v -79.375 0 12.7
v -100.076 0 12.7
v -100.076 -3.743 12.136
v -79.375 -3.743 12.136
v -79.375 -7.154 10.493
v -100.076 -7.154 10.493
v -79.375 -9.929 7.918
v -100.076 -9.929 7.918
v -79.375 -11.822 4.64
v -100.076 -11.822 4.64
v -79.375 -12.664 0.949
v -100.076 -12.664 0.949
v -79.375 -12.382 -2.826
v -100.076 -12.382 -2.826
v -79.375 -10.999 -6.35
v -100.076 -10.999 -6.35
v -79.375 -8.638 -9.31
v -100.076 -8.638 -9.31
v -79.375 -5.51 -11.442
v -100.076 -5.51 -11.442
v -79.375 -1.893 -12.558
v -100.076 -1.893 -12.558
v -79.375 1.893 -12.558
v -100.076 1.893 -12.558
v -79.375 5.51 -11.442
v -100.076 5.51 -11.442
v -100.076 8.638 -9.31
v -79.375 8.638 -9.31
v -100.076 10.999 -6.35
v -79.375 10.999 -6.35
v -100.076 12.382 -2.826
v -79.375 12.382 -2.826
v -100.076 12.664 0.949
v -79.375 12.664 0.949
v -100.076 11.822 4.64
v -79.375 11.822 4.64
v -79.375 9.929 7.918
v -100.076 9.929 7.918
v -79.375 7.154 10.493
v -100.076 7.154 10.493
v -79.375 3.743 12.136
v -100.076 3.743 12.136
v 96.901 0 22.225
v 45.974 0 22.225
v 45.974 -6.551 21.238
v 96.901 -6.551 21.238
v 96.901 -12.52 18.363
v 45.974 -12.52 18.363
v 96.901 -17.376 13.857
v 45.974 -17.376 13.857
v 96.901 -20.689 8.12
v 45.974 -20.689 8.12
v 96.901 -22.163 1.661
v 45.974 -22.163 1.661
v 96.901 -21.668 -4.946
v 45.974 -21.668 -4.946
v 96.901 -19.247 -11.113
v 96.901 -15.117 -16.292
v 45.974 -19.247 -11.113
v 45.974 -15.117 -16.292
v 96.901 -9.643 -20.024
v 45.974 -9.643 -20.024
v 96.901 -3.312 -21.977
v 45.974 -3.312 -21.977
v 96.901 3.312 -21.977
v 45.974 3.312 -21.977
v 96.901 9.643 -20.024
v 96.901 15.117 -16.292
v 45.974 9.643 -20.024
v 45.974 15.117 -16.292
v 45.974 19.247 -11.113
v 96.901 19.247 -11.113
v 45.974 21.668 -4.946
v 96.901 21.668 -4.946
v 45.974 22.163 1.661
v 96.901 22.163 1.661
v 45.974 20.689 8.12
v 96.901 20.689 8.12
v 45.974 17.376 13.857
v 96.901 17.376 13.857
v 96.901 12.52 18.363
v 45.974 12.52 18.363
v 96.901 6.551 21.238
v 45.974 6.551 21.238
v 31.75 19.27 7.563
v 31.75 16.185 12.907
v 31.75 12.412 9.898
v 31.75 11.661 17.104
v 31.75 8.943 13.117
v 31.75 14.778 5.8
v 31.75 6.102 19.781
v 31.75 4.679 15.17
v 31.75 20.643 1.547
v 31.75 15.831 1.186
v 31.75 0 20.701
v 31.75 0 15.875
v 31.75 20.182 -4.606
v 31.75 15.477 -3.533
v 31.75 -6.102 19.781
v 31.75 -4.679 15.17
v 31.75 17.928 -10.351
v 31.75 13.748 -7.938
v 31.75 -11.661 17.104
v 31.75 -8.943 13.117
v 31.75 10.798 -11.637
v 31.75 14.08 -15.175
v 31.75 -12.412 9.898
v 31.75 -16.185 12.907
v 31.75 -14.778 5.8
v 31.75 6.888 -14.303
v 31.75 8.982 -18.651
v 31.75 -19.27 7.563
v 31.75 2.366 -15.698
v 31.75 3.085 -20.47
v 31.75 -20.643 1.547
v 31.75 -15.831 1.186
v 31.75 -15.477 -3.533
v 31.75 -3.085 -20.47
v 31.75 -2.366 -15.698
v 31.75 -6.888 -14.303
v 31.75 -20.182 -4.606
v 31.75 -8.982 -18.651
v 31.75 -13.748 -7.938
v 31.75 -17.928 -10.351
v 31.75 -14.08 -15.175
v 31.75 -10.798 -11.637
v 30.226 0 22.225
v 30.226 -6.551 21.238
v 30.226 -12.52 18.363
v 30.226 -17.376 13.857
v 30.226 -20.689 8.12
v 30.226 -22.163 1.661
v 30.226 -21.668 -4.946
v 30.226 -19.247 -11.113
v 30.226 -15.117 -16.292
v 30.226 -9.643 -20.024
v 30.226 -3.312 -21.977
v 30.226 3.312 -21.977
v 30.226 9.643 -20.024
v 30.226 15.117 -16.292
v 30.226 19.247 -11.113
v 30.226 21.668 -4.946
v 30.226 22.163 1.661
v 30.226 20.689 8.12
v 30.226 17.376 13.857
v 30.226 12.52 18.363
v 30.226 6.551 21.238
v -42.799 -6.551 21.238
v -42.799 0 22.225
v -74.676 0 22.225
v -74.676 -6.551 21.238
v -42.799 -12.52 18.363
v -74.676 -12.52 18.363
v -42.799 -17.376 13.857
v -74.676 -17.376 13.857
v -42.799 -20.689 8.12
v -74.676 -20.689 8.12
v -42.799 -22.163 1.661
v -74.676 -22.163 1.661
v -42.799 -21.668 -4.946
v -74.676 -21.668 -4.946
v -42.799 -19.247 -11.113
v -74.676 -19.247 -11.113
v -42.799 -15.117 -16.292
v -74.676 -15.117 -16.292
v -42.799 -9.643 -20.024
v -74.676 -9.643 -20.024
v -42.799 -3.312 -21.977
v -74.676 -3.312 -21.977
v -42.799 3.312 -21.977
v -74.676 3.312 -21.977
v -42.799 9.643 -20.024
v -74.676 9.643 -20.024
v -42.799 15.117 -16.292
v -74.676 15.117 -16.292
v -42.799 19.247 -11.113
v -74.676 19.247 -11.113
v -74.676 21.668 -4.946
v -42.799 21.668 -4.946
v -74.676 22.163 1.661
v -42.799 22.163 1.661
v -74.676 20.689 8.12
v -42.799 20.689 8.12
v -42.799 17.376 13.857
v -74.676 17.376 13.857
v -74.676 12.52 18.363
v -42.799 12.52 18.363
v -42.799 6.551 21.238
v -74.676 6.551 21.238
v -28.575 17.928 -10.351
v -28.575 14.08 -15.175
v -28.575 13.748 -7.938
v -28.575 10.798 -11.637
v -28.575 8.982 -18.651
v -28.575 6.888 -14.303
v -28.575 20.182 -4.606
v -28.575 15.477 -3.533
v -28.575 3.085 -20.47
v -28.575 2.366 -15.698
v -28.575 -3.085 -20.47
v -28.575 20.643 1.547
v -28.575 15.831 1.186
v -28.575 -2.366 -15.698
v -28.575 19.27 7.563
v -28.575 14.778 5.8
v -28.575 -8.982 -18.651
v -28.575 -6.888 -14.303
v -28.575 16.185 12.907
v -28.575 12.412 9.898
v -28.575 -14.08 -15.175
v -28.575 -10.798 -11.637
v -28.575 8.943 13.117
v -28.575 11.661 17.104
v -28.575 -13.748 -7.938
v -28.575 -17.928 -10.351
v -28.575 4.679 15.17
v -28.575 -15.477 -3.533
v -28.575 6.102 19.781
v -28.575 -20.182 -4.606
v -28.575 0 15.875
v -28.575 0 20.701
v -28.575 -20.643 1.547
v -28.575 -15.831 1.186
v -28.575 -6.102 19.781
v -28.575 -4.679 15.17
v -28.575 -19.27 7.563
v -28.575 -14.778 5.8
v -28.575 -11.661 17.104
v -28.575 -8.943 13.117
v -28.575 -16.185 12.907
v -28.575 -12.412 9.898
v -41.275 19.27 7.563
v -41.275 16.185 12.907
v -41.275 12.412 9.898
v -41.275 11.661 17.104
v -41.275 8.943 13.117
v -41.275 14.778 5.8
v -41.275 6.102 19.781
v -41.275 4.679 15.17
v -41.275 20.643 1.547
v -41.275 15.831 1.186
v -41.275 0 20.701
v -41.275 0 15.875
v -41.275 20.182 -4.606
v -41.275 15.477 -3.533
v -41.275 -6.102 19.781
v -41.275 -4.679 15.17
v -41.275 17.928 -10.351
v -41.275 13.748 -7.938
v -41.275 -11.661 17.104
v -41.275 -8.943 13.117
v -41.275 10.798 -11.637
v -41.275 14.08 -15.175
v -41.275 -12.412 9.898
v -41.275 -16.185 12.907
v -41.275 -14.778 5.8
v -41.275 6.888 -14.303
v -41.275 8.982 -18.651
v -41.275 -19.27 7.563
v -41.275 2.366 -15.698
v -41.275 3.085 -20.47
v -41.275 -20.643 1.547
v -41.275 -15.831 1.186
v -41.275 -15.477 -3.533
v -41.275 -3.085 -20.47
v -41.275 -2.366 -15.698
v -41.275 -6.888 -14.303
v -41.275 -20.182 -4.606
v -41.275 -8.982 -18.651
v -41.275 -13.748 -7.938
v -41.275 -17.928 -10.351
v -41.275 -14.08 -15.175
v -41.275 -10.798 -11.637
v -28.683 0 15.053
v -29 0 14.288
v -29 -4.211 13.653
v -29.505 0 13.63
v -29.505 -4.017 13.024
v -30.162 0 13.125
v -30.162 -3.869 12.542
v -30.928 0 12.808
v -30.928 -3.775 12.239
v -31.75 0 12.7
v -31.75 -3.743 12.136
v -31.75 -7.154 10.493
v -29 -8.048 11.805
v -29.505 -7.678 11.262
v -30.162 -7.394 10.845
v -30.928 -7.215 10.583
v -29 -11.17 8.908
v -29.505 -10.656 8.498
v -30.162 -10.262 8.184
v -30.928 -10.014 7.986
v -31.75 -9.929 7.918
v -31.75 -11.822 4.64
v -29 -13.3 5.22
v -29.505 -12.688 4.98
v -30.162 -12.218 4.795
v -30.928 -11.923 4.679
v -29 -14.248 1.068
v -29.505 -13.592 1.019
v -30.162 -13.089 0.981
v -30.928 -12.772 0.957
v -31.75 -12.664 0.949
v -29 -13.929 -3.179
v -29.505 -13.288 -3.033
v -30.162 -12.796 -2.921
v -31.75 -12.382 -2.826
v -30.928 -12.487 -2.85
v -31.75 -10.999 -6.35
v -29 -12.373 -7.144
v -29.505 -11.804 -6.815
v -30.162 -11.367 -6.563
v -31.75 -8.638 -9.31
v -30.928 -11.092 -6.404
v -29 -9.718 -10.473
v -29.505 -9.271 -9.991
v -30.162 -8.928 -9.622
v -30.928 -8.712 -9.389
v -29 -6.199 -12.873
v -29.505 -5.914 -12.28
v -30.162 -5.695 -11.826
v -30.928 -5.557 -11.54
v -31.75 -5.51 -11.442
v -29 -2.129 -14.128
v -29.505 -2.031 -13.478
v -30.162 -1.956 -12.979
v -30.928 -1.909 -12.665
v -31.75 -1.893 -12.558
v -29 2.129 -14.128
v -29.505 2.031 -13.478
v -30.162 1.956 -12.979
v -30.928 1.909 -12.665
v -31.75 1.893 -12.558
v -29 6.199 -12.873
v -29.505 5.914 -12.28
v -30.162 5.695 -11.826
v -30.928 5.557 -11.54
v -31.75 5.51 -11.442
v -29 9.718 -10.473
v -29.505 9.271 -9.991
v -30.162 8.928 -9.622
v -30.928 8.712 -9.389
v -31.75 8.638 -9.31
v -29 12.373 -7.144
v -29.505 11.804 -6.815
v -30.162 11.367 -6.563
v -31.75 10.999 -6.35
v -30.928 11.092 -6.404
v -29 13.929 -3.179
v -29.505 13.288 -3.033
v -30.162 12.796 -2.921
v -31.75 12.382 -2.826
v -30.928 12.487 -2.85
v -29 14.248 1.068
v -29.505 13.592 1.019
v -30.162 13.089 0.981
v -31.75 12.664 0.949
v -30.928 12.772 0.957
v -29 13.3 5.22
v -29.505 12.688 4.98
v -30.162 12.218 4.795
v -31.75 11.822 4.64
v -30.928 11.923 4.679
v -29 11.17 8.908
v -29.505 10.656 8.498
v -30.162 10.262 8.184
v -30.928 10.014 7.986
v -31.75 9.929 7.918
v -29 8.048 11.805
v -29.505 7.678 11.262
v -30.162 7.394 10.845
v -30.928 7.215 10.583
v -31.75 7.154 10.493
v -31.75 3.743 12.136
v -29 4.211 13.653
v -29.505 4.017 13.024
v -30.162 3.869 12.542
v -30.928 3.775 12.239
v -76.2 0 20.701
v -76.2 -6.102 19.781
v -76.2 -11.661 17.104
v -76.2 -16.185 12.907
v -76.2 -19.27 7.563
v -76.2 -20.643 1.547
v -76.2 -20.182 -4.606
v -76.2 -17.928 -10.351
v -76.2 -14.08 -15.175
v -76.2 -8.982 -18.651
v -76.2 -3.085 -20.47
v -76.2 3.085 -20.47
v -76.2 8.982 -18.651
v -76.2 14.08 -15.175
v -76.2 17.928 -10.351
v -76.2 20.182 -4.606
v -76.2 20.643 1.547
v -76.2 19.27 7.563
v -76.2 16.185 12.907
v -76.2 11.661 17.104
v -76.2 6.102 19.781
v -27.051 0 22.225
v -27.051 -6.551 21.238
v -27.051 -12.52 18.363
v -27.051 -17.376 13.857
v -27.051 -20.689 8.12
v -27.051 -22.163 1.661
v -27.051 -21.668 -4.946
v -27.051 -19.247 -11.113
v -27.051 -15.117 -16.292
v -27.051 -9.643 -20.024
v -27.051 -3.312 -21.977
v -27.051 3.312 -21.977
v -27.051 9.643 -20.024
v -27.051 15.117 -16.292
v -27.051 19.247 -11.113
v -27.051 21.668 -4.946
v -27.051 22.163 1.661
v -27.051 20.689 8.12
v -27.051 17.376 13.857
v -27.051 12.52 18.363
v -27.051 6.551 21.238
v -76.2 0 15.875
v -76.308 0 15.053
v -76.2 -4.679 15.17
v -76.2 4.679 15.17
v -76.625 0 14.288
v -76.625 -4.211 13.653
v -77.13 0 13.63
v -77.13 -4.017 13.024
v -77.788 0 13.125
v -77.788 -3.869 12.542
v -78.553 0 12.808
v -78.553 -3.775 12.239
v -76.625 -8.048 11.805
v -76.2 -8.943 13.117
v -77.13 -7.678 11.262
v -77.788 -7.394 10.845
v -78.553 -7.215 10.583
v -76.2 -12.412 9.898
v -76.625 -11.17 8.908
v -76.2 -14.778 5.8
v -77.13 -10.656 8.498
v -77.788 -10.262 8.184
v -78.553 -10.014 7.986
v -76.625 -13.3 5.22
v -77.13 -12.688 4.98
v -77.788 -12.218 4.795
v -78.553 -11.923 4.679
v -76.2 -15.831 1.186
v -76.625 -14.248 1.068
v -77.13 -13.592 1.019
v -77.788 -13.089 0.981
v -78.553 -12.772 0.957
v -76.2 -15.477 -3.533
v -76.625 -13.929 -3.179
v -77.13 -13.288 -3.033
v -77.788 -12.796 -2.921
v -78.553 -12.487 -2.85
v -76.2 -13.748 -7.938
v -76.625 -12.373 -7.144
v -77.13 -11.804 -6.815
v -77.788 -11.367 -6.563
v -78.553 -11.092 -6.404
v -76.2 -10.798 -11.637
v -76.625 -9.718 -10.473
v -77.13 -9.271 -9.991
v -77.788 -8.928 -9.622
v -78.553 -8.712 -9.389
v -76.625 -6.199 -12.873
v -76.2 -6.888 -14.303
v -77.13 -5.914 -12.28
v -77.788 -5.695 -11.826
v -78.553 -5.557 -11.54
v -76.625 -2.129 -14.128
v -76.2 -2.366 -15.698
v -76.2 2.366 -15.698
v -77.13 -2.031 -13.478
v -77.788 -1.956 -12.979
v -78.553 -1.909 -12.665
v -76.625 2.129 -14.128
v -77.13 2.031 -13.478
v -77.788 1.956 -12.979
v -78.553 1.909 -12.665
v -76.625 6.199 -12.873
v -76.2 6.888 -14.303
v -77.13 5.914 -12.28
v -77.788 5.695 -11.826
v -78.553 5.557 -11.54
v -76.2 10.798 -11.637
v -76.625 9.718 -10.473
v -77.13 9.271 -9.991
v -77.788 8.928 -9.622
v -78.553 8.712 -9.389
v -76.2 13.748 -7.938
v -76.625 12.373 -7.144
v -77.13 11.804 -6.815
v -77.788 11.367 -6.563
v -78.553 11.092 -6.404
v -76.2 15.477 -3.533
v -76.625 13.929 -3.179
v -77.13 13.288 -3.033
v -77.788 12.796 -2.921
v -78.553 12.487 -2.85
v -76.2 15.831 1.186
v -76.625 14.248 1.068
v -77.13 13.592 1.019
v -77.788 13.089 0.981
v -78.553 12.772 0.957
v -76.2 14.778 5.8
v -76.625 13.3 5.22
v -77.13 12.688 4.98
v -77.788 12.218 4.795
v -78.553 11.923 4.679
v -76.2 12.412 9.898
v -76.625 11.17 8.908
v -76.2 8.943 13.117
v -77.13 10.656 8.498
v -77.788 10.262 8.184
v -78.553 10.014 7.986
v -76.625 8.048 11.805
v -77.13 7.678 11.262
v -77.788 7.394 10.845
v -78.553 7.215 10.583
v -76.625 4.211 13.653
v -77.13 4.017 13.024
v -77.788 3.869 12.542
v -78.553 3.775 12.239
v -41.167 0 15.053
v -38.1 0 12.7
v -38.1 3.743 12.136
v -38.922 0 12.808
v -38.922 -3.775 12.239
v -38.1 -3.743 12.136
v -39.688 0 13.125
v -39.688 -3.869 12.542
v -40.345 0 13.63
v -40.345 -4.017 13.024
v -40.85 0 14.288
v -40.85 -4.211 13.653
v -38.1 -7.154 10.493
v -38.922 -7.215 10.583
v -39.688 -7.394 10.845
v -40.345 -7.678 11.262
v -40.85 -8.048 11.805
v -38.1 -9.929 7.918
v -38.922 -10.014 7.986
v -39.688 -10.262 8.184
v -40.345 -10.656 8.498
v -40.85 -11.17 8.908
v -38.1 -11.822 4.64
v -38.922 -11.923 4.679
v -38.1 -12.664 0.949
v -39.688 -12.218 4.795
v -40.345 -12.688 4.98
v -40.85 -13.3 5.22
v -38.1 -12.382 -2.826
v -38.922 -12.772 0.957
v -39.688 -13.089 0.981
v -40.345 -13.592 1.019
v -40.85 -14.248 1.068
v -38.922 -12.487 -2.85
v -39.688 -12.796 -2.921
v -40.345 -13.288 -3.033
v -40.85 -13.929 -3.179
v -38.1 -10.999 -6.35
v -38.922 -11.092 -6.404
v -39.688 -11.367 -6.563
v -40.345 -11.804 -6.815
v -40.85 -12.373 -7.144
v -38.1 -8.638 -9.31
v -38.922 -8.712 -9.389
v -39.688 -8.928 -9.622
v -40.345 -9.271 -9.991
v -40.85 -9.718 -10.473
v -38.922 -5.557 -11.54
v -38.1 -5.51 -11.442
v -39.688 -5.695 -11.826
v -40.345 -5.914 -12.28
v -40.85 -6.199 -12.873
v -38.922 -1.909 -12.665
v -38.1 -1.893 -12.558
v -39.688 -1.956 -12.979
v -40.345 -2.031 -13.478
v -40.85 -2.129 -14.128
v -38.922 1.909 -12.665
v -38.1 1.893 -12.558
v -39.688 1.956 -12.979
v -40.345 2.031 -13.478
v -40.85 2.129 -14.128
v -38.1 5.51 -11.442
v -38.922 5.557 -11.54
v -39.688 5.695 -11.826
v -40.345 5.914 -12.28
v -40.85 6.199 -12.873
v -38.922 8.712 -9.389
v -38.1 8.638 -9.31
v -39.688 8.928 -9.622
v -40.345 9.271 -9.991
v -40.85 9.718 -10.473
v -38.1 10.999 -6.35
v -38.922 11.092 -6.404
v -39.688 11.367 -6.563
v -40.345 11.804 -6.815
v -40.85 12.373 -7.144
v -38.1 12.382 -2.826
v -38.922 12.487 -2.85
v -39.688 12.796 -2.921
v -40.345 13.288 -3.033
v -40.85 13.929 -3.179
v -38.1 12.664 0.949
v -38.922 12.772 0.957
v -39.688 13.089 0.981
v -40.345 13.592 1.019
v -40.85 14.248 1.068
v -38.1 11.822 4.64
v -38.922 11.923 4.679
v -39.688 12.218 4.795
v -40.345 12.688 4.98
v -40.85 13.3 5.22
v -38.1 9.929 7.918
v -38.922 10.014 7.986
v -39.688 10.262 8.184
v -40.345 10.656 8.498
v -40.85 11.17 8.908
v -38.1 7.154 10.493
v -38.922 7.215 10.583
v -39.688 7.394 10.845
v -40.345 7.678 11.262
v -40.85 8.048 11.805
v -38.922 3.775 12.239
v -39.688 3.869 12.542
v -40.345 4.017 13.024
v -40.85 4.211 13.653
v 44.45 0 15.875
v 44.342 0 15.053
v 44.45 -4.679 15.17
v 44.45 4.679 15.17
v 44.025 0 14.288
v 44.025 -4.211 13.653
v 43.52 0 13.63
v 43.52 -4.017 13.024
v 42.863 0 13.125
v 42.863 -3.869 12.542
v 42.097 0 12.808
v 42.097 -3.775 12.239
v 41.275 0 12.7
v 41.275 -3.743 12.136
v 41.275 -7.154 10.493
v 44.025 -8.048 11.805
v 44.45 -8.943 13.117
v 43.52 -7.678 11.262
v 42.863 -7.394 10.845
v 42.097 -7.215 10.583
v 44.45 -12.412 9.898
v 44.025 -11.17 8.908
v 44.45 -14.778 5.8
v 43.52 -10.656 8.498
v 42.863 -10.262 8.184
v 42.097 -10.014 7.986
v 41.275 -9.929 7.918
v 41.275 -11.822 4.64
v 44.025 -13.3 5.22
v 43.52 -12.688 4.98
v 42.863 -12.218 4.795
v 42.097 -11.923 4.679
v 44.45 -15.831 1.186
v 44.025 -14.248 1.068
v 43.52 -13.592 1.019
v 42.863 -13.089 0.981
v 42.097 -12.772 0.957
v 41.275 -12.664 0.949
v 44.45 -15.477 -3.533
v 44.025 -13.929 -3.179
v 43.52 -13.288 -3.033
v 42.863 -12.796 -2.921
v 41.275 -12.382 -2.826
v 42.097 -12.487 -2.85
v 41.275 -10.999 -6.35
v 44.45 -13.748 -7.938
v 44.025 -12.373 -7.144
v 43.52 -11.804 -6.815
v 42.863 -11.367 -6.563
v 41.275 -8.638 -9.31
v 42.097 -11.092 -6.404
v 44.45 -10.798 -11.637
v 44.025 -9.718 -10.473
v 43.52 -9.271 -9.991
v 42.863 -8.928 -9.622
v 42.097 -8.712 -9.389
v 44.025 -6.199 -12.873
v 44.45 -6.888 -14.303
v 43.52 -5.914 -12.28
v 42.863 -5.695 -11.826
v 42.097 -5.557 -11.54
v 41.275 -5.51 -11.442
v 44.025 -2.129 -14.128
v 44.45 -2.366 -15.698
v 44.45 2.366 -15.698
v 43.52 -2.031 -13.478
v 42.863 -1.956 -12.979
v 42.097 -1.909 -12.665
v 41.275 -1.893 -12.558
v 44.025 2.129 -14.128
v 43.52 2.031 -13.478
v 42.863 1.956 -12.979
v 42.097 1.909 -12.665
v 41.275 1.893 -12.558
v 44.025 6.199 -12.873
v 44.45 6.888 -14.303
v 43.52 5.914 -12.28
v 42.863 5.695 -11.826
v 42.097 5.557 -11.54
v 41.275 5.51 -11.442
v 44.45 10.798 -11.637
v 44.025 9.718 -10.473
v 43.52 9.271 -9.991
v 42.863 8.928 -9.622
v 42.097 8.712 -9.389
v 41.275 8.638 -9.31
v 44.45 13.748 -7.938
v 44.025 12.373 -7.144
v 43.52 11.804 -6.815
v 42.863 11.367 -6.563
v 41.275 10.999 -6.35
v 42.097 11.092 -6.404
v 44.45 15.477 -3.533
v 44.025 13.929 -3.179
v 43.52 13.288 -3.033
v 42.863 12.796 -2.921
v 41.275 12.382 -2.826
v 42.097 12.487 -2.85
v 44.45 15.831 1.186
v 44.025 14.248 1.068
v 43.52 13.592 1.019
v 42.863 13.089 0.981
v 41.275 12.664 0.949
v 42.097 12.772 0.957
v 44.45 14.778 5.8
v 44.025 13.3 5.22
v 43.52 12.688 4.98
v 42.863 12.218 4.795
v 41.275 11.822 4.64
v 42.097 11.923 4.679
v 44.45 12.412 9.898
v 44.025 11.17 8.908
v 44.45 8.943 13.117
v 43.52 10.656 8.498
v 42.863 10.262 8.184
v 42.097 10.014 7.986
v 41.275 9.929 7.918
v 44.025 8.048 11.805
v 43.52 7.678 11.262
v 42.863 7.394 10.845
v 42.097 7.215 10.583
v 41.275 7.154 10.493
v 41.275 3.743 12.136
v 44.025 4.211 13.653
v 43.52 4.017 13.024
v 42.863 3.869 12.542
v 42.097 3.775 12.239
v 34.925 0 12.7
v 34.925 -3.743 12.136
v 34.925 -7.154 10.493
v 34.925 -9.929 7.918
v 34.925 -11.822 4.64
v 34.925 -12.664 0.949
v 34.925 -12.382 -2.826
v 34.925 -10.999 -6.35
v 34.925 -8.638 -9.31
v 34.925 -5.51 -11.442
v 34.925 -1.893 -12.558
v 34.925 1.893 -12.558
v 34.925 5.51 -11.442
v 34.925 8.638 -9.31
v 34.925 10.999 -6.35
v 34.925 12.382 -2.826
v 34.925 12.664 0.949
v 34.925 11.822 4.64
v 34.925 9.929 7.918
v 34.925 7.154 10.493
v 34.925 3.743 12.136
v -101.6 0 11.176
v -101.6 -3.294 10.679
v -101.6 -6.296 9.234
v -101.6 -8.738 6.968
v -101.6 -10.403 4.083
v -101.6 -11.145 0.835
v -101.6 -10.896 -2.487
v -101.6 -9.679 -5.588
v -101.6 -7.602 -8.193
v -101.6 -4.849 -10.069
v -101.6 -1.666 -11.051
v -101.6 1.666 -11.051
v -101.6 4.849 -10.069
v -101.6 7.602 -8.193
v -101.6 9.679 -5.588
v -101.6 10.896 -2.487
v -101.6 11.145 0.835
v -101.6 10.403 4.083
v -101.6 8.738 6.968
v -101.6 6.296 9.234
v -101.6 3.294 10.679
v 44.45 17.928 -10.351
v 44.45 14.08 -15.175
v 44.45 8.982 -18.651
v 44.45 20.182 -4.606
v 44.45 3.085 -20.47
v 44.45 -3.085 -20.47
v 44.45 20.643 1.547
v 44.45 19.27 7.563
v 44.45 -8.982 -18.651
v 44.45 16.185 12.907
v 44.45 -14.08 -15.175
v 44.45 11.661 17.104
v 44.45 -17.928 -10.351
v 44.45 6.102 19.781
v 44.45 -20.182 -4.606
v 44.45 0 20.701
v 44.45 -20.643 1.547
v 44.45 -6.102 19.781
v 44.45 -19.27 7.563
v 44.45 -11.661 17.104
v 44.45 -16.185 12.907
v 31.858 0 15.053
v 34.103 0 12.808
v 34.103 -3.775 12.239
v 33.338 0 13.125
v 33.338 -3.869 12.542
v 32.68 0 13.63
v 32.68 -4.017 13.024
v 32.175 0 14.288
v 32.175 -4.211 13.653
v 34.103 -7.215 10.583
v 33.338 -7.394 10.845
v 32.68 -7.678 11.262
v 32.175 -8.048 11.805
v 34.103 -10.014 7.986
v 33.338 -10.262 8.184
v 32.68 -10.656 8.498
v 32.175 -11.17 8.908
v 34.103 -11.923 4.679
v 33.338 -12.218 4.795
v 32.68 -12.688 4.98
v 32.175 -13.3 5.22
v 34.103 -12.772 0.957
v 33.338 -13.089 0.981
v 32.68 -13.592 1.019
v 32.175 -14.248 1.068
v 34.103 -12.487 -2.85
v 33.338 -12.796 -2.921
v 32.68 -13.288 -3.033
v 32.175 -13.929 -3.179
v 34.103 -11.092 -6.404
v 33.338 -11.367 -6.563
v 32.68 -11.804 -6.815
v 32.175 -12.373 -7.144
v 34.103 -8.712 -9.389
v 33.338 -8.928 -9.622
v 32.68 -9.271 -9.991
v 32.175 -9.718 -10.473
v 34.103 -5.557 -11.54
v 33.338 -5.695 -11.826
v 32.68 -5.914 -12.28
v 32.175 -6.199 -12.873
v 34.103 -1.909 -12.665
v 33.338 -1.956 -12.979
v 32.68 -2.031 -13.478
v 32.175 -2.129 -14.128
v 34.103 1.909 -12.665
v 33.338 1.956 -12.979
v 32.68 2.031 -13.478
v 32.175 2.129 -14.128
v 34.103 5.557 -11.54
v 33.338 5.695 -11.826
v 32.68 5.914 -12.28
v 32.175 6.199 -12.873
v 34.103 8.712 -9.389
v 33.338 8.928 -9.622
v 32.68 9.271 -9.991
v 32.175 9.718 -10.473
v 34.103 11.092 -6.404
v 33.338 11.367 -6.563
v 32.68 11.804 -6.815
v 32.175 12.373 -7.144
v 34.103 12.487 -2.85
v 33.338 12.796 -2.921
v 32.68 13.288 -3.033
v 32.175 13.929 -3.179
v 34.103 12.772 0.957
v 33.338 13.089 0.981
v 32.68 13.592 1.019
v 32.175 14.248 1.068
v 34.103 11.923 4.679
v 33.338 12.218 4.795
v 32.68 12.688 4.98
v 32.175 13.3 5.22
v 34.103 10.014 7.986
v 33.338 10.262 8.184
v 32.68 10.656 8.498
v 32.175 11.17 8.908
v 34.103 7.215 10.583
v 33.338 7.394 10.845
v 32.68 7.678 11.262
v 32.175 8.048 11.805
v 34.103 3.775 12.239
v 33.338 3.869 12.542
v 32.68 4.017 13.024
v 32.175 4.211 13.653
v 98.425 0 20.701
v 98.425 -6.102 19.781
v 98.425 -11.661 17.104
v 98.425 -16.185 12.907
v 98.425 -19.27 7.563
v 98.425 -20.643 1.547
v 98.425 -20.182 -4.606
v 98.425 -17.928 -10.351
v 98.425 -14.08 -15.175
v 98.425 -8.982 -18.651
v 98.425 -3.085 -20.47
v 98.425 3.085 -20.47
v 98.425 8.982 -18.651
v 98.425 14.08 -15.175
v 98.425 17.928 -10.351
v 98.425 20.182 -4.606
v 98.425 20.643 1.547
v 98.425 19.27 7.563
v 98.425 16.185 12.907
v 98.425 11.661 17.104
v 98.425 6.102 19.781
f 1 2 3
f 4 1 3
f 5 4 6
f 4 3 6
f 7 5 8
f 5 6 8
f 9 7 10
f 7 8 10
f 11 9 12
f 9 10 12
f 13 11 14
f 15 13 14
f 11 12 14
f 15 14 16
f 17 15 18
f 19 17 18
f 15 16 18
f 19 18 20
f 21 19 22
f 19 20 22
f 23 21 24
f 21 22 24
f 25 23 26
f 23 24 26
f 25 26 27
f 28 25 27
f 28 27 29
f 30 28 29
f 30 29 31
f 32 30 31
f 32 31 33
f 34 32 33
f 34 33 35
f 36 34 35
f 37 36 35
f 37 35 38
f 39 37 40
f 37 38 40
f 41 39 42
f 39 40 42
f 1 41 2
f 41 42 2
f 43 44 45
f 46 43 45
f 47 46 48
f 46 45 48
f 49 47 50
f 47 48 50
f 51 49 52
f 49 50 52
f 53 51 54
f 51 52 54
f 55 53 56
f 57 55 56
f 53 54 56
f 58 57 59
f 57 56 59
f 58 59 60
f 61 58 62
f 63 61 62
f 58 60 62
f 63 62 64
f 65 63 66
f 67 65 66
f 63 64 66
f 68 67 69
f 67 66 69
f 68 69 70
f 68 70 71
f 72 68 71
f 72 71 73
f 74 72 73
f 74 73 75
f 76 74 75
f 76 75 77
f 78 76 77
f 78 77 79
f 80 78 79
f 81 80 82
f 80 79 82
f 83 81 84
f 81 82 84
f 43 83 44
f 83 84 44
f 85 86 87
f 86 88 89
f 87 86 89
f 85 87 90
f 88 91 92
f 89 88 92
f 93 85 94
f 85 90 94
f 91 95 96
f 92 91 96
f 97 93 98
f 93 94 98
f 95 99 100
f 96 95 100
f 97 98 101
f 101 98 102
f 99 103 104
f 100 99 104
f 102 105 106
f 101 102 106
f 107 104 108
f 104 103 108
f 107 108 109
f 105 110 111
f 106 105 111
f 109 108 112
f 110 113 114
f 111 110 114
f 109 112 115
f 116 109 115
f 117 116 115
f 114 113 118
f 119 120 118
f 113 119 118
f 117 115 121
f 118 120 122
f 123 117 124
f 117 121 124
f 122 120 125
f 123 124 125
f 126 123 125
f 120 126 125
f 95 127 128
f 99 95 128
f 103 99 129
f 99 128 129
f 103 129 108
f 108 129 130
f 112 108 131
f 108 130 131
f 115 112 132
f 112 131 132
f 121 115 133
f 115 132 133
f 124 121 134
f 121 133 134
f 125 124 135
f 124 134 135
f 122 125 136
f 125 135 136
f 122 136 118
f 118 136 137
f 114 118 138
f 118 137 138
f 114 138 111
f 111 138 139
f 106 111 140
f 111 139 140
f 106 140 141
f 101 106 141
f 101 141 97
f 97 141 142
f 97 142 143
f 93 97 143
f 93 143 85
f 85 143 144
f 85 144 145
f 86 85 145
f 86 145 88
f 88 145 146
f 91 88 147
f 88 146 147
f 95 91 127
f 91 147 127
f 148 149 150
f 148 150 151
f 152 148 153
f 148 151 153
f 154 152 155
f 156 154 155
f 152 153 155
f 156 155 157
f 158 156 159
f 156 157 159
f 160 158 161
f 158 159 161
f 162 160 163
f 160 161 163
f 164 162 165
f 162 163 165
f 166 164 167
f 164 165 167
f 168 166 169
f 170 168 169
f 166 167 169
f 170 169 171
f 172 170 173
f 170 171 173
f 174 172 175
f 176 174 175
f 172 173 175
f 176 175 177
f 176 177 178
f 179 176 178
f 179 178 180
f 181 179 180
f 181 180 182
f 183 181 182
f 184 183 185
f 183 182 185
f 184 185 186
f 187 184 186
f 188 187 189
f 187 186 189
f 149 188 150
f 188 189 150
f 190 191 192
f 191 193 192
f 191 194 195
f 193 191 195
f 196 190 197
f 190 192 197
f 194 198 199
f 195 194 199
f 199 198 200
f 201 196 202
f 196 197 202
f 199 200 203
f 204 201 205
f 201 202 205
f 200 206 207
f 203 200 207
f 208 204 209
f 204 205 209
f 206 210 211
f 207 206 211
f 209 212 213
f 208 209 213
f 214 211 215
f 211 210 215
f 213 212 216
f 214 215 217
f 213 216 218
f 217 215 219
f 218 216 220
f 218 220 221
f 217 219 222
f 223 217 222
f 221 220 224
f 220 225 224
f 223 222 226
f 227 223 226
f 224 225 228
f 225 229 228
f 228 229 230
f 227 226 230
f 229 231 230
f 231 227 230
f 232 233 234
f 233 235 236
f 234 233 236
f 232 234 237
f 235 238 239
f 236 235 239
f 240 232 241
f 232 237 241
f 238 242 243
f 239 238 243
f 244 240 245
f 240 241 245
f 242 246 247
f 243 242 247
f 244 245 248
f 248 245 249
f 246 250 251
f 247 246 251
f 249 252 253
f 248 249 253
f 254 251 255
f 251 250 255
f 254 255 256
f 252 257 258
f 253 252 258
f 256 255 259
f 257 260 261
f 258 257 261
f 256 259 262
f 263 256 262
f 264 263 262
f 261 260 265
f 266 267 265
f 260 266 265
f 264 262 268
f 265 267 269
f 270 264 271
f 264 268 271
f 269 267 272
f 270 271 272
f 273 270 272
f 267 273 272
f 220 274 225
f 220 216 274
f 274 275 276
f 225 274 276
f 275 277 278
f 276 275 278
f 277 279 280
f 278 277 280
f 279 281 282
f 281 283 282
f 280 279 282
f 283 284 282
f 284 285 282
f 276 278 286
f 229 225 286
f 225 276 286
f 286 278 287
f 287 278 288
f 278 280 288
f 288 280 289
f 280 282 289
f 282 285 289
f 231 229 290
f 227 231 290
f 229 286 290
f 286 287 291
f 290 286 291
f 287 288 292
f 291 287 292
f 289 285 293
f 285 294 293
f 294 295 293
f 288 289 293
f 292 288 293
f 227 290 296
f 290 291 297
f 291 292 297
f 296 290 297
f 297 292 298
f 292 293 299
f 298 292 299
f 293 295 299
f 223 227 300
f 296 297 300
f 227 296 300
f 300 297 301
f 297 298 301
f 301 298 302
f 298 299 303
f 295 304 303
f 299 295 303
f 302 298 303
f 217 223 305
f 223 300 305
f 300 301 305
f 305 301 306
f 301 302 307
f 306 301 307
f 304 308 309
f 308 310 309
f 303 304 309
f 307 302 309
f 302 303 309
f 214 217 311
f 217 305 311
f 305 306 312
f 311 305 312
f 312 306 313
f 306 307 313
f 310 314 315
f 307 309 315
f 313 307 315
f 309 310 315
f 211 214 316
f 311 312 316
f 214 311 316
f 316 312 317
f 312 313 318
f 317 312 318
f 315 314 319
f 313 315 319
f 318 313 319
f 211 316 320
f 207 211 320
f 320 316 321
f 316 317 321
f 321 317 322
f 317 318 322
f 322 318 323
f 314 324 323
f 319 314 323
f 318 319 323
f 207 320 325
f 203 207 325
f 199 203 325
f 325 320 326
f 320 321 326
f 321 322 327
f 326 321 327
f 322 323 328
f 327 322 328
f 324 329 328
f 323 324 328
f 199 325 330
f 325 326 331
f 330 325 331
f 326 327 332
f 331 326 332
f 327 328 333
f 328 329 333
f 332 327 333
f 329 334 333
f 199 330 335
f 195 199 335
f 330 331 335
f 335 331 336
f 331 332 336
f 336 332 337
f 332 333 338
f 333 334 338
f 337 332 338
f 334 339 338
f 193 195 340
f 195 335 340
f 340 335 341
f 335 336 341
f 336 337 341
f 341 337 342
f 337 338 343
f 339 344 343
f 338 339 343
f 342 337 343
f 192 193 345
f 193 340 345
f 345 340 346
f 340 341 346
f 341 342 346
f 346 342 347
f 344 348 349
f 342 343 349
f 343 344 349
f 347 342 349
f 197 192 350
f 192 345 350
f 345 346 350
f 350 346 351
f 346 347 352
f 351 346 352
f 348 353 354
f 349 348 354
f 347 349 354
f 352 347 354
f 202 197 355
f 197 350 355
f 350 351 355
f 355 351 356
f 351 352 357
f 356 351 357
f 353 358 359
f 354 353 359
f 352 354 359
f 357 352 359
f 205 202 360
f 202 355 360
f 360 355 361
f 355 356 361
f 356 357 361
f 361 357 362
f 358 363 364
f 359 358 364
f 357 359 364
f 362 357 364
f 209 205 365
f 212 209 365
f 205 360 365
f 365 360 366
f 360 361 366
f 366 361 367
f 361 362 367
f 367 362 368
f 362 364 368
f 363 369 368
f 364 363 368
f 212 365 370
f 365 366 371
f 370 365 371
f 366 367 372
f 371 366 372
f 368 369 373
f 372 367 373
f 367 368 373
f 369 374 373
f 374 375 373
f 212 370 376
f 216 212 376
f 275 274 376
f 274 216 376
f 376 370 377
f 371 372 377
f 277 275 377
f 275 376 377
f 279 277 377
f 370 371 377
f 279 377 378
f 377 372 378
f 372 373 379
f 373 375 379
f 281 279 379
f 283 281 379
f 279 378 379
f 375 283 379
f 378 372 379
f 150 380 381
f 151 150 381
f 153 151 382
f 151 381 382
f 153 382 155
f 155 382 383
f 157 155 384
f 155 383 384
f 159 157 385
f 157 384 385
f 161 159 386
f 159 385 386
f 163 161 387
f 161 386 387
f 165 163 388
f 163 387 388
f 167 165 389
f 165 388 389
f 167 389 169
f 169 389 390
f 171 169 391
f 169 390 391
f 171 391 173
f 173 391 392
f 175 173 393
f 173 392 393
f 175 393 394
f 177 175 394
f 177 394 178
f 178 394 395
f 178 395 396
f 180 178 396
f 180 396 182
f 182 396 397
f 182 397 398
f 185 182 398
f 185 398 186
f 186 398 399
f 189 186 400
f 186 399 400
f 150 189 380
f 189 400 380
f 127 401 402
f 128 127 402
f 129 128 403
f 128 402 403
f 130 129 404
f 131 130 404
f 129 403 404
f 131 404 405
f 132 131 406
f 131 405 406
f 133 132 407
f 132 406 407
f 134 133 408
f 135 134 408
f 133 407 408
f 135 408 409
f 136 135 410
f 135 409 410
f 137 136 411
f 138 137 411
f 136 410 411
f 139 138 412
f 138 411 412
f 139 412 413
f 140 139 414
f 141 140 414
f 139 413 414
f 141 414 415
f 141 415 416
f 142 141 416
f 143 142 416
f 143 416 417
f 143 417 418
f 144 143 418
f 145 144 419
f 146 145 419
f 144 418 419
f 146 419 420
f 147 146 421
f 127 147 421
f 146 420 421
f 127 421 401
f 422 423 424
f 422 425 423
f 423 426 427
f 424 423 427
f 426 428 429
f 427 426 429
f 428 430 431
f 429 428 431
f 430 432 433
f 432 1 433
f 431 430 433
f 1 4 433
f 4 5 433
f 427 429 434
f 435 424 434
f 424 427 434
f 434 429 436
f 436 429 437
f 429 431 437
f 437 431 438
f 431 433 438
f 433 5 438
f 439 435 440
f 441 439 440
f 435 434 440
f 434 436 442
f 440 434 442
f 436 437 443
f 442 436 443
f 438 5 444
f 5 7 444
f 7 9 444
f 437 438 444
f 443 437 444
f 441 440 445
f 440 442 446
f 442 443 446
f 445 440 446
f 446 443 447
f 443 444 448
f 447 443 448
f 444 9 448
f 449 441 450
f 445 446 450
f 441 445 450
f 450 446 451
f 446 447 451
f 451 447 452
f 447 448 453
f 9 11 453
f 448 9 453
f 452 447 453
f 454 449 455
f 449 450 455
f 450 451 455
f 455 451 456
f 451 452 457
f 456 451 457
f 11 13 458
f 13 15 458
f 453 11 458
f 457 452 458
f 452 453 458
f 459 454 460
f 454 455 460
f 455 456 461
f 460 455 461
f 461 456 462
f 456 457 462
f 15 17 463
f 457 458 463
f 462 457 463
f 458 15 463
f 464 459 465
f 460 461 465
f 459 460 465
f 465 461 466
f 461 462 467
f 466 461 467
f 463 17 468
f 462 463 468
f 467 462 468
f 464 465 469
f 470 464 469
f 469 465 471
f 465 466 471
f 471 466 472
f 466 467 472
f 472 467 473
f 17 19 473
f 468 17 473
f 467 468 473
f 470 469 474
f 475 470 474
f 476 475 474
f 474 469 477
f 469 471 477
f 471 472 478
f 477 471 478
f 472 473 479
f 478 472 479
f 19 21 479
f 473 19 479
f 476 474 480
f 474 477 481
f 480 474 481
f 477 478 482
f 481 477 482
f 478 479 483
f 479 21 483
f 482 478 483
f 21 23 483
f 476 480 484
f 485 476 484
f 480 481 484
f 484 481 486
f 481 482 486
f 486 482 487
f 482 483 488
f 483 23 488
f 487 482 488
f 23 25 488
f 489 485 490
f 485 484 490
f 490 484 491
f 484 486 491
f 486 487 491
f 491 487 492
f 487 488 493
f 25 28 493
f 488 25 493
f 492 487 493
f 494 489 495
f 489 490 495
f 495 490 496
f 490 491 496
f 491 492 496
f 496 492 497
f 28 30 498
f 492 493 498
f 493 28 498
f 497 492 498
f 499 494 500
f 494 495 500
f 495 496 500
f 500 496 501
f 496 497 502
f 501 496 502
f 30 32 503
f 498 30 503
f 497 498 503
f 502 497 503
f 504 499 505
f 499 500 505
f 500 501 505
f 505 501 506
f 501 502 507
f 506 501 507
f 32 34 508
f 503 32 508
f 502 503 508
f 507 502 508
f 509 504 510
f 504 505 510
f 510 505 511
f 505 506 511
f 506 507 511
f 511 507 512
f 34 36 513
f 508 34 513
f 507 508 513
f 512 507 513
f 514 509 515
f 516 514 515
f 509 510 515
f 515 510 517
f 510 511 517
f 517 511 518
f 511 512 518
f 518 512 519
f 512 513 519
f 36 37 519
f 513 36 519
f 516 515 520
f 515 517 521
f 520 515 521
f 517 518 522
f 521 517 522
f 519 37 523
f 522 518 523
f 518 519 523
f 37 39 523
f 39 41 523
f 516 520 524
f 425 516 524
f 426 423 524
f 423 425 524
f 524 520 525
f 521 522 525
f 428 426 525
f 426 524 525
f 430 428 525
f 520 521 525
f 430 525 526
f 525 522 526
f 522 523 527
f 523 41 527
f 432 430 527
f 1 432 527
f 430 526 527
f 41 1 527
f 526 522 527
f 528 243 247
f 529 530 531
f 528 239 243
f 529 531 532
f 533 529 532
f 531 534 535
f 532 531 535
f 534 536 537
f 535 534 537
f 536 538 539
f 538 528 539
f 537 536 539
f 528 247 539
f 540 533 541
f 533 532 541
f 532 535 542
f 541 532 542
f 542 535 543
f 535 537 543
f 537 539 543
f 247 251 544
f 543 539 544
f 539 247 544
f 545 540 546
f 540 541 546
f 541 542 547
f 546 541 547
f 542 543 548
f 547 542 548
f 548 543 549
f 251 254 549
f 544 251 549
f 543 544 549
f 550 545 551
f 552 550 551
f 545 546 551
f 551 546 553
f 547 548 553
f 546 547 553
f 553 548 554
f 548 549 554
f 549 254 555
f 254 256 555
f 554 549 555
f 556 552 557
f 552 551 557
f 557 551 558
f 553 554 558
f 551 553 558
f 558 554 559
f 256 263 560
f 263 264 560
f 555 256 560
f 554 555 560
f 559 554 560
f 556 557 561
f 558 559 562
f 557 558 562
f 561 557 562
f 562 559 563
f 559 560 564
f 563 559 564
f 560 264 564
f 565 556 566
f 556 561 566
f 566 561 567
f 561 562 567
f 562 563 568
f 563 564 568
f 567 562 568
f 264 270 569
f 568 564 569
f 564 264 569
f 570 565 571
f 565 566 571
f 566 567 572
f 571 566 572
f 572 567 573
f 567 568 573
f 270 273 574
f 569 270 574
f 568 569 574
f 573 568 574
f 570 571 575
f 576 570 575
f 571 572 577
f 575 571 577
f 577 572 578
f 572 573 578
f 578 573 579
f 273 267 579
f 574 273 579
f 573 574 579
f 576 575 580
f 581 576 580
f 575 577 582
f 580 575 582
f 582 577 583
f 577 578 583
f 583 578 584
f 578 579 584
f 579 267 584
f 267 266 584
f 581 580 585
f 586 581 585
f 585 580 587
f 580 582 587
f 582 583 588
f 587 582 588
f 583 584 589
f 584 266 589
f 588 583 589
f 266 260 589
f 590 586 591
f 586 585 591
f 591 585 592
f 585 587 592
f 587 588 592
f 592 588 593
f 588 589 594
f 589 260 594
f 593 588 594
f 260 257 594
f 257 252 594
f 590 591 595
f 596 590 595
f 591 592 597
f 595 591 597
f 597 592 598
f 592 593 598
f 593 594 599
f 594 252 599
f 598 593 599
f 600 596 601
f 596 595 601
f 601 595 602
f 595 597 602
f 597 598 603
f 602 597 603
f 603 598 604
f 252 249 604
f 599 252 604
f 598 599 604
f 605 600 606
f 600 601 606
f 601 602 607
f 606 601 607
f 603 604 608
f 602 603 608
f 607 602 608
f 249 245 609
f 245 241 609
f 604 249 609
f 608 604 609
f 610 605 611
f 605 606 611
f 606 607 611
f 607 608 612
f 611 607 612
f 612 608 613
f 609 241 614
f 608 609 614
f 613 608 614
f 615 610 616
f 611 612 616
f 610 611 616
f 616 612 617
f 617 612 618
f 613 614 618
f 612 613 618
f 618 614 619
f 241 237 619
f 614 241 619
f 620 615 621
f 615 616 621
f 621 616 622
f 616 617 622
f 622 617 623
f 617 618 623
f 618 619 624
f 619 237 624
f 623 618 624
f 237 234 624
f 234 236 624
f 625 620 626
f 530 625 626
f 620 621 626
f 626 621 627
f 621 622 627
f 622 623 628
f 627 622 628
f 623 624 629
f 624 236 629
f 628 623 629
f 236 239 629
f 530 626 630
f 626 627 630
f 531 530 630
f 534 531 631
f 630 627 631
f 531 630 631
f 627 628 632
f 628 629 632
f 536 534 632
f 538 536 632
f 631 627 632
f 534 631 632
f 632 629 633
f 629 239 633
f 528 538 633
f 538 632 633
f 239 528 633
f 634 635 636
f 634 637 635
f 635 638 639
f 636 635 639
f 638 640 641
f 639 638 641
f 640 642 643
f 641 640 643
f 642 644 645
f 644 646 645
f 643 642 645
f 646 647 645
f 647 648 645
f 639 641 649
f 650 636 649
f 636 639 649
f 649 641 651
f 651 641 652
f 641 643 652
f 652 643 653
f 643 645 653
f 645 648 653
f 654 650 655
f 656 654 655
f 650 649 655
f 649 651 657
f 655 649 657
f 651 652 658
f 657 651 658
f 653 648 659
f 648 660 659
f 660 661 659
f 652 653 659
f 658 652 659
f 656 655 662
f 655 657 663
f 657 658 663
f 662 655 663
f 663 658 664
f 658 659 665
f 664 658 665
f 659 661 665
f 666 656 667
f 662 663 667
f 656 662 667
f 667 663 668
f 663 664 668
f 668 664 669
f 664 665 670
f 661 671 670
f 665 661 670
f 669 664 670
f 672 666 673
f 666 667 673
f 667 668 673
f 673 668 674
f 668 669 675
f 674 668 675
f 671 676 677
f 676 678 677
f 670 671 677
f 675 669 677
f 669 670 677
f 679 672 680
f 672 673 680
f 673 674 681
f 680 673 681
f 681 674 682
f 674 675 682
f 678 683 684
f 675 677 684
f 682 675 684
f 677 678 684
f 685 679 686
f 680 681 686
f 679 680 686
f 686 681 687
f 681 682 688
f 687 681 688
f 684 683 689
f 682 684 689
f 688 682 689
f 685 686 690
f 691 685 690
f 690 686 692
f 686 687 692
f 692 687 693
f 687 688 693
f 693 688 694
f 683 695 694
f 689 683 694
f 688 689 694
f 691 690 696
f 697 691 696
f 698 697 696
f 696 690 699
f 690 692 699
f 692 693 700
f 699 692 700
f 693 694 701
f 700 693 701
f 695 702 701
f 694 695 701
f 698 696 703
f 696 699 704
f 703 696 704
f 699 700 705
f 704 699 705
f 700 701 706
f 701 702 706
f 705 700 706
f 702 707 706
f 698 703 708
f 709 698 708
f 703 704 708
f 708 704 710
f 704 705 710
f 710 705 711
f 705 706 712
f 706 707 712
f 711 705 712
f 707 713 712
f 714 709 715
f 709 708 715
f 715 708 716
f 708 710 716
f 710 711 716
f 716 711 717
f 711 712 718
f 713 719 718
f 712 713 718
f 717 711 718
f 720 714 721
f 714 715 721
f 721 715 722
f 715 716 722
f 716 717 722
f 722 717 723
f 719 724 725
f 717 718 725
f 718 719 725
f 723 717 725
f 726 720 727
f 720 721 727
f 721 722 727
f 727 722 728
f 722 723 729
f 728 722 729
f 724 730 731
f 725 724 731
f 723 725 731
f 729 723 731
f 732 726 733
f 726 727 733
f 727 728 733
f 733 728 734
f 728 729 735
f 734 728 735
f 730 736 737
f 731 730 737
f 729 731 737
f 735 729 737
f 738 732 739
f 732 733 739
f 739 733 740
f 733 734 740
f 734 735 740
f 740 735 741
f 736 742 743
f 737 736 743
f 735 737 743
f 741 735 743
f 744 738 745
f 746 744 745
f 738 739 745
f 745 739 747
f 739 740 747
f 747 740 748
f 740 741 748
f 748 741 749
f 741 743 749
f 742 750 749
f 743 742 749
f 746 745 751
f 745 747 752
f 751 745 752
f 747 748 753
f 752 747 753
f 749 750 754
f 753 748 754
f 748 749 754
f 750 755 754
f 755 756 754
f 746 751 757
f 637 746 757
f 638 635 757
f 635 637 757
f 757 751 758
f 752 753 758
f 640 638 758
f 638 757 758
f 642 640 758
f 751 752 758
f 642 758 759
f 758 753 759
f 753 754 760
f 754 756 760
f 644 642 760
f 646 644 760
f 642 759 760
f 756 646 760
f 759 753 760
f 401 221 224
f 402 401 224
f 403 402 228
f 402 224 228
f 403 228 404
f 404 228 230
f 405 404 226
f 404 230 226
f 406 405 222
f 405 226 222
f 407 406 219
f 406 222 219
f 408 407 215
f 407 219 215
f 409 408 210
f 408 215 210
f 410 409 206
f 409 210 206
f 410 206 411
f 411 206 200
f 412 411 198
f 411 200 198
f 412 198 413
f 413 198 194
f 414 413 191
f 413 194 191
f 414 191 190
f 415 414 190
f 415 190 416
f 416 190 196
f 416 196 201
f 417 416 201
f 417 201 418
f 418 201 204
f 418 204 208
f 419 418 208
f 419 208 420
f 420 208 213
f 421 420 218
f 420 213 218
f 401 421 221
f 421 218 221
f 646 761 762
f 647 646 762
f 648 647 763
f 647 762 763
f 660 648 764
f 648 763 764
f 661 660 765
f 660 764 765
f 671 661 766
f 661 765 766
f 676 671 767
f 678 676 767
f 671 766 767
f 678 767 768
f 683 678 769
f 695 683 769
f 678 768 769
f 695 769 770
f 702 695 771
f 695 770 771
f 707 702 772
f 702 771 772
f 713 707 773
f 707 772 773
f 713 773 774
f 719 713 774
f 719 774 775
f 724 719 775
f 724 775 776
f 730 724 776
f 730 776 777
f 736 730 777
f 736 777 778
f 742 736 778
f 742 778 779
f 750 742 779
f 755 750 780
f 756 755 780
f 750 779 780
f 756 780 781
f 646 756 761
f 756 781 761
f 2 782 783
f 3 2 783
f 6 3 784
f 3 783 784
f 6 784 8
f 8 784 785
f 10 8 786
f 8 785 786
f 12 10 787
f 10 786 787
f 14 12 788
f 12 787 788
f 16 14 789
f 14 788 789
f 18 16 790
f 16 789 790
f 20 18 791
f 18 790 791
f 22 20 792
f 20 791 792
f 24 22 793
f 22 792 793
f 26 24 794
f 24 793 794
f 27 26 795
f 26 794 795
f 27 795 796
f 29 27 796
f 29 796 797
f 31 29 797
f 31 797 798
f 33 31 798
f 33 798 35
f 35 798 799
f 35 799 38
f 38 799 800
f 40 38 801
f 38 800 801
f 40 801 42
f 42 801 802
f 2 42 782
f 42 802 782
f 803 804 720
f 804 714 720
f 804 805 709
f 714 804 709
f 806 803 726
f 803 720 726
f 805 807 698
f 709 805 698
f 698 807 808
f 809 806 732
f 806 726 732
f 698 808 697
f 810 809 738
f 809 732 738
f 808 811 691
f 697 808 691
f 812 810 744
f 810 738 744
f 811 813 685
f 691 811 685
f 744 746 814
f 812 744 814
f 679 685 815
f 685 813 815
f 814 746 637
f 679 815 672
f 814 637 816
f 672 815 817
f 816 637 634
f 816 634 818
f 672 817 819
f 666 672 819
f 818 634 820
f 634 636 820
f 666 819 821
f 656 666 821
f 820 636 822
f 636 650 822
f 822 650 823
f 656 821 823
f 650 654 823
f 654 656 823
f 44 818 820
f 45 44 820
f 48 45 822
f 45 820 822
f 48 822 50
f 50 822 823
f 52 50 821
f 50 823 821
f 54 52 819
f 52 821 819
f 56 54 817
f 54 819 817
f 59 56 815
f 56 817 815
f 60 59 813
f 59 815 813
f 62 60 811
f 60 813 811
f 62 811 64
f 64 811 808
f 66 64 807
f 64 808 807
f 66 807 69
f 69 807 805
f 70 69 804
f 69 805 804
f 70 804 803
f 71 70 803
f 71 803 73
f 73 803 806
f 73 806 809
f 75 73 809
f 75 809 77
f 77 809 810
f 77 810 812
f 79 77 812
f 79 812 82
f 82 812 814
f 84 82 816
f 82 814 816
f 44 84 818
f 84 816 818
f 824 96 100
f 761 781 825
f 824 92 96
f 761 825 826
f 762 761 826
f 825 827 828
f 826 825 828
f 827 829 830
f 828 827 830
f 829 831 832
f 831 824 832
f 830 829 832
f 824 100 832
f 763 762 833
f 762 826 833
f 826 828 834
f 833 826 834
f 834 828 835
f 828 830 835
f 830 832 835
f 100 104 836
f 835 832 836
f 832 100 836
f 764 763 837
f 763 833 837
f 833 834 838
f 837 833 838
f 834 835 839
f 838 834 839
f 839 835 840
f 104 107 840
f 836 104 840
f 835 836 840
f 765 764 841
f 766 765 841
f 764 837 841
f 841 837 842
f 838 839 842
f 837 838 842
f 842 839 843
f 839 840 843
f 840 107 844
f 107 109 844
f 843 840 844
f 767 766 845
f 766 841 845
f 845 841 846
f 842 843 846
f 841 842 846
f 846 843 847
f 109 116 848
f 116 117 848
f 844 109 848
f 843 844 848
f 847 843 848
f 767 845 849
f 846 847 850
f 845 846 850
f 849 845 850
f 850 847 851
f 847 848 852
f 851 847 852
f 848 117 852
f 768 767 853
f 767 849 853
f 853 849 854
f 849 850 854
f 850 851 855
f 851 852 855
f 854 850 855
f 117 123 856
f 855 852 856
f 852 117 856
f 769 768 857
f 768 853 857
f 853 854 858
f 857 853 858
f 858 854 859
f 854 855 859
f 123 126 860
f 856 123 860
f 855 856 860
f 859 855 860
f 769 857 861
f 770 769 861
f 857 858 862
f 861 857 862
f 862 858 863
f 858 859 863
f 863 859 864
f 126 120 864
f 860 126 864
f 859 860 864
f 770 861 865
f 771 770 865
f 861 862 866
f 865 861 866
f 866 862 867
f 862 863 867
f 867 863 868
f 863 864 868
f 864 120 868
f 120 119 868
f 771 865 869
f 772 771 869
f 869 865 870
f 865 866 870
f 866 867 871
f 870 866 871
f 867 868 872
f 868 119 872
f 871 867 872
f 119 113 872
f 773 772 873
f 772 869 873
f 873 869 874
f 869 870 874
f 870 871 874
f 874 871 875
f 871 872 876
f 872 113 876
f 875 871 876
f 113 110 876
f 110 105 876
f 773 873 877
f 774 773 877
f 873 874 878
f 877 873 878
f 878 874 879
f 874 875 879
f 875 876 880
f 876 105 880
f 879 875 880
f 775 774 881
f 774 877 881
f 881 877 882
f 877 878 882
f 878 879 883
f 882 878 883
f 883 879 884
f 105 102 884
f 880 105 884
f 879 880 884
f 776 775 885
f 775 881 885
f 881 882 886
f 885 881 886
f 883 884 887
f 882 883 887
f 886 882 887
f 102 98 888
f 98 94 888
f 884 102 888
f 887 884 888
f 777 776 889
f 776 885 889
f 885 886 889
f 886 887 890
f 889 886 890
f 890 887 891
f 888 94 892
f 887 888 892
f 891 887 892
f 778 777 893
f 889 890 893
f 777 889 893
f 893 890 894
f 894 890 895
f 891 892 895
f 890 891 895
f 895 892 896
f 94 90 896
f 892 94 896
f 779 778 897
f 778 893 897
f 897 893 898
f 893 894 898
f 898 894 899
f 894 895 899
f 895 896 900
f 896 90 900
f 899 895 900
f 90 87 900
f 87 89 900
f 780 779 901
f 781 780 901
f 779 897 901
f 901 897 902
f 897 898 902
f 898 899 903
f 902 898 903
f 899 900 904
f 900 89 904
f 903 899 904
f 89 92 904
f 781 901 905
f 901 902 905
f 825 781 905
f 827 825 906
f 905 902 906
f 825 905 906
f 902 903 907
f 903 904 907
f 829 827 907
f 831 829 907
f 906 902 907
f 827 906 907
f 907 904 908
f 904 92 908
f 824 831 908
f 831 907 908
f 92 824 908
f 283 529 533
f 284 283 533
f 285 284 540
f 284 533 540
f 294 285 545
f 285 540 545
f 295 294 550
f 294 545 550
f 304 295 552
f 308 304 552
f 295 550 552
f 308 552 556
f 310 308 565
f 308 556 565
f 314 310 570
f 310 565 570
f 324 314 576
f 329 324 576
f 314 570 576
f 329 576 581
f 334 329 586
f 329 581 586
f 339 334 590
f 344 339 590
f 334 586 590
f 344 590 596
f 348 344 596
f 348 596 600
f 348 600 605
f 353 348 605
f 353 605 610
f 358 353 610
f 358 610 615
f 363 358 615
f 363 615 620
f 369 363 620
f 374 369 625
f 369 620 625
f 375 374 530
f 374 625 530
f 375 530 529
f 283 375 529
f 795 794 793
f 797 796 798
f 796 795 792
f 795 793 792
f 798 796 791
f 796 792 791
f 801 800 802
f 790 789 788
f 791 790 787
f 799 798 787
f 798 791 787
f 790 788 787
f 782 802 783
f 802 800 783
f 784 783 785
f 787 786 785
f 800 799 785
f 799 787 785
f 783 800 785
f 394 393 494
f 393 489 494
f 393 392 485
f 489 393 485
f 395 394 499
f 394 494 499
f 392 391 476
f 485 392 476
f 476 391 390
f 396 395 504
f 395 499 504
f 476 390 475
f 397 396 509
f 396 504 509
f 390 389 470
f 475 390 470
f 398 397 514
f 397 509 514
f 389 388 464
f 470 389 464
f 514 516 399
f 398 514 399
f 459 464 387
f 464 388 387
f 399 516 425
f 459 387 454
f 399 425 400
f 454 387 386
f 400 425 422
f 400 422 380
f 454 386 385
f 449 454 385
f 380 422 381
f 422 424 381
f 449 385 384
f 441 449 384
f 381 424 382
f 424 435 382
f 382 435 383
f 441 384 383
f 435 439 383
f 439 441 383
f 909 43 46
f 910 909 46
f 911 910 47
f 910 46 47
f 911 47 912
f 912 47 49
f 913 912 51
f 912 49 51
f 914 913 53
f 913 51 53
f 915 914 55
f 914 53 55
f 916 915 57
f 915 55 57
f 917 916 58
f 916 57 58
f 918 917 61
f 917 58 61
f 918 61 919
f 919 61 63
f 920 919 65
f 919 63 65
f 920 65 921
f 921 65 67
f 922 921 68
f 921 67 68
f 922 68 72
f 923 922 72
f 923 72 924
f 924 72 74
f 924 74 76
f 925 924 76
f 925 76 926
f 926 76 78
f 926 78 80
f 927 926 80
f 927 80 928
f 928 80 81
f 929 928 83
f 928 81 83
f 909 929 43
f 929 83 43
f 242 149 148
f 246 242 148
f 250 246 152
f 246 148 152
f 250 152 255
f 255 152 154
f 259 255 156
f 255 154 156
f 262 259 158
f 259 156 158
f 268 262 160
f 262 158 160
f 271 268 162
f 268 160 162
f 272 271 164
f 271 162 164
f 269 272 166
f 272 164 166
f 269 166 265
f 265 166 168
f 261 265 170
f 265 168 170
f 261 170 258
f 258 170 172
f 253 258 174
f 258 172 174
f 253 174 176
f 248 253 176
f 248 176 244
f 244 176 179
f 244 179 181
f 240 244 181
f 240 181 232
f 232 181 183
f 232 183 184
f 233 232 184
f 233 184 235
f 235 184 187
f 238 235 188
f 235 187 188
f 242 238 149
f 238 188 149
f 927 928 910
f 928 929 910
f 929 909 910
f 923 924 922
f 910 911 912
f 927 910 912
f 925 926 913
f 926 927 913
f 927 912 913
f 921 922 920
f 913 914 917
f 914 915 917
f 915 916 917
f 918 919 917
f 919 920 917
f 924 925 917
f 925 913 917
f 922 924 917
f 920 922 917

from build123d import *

# Parameters (mm, degrees)
F2_SIZE = 1.524
F3_R    = 3.175


with BuildPart() as f1:
    # F0 (on Front) → F1 (revolve)
    with BuildSketch(Plane.XZ):
        Polygon((-101.6, 0), (98.425, 0), (98.425, 22.225), (44.45, 22.225), (44.45, 12.7), (31.75, 12.7), (31.75, 22.225), (-28.575, 22.225), (-28.575, 12.7), (-41.275, 12.7), (-41.275, 22.225), (-76.2, 22.225), (-76.2, 12.7), (-101.6, 12.7), align=None)
    revolve(axis=Axis((-1.658771, 0, 0), (1, 0, 0)))

    # F2
    f2_edges = [f1.edges().sort_by_distance(p)[0] for p in [
        (-101.6, 0, -12.7),
        (-76.2, 0, -22.225),
        (-41.275, 0, -22.225),
        (-28.575, 0, -22.225),
        (31.75, 0, -22.225),
        (44.45, 0, -22.225),
        (98.425, 0, -22.225),
    ]]
    chamfer(f2_edges, length=F2_SIZE)

    # F3
    f3_edges = [f1.edges().sort_by_distance(p)[0] for p in [
        (-76.2, 0, -12.7),
        (-28.575, 0, -12.7),
        (44.45, 0, -12.7),
        (-41.275, 0, -12.7),
        (31.75, 0, -12.7),
    ]]
    fillet(f3_edges, radius=F3_R)


solid = f1.part
